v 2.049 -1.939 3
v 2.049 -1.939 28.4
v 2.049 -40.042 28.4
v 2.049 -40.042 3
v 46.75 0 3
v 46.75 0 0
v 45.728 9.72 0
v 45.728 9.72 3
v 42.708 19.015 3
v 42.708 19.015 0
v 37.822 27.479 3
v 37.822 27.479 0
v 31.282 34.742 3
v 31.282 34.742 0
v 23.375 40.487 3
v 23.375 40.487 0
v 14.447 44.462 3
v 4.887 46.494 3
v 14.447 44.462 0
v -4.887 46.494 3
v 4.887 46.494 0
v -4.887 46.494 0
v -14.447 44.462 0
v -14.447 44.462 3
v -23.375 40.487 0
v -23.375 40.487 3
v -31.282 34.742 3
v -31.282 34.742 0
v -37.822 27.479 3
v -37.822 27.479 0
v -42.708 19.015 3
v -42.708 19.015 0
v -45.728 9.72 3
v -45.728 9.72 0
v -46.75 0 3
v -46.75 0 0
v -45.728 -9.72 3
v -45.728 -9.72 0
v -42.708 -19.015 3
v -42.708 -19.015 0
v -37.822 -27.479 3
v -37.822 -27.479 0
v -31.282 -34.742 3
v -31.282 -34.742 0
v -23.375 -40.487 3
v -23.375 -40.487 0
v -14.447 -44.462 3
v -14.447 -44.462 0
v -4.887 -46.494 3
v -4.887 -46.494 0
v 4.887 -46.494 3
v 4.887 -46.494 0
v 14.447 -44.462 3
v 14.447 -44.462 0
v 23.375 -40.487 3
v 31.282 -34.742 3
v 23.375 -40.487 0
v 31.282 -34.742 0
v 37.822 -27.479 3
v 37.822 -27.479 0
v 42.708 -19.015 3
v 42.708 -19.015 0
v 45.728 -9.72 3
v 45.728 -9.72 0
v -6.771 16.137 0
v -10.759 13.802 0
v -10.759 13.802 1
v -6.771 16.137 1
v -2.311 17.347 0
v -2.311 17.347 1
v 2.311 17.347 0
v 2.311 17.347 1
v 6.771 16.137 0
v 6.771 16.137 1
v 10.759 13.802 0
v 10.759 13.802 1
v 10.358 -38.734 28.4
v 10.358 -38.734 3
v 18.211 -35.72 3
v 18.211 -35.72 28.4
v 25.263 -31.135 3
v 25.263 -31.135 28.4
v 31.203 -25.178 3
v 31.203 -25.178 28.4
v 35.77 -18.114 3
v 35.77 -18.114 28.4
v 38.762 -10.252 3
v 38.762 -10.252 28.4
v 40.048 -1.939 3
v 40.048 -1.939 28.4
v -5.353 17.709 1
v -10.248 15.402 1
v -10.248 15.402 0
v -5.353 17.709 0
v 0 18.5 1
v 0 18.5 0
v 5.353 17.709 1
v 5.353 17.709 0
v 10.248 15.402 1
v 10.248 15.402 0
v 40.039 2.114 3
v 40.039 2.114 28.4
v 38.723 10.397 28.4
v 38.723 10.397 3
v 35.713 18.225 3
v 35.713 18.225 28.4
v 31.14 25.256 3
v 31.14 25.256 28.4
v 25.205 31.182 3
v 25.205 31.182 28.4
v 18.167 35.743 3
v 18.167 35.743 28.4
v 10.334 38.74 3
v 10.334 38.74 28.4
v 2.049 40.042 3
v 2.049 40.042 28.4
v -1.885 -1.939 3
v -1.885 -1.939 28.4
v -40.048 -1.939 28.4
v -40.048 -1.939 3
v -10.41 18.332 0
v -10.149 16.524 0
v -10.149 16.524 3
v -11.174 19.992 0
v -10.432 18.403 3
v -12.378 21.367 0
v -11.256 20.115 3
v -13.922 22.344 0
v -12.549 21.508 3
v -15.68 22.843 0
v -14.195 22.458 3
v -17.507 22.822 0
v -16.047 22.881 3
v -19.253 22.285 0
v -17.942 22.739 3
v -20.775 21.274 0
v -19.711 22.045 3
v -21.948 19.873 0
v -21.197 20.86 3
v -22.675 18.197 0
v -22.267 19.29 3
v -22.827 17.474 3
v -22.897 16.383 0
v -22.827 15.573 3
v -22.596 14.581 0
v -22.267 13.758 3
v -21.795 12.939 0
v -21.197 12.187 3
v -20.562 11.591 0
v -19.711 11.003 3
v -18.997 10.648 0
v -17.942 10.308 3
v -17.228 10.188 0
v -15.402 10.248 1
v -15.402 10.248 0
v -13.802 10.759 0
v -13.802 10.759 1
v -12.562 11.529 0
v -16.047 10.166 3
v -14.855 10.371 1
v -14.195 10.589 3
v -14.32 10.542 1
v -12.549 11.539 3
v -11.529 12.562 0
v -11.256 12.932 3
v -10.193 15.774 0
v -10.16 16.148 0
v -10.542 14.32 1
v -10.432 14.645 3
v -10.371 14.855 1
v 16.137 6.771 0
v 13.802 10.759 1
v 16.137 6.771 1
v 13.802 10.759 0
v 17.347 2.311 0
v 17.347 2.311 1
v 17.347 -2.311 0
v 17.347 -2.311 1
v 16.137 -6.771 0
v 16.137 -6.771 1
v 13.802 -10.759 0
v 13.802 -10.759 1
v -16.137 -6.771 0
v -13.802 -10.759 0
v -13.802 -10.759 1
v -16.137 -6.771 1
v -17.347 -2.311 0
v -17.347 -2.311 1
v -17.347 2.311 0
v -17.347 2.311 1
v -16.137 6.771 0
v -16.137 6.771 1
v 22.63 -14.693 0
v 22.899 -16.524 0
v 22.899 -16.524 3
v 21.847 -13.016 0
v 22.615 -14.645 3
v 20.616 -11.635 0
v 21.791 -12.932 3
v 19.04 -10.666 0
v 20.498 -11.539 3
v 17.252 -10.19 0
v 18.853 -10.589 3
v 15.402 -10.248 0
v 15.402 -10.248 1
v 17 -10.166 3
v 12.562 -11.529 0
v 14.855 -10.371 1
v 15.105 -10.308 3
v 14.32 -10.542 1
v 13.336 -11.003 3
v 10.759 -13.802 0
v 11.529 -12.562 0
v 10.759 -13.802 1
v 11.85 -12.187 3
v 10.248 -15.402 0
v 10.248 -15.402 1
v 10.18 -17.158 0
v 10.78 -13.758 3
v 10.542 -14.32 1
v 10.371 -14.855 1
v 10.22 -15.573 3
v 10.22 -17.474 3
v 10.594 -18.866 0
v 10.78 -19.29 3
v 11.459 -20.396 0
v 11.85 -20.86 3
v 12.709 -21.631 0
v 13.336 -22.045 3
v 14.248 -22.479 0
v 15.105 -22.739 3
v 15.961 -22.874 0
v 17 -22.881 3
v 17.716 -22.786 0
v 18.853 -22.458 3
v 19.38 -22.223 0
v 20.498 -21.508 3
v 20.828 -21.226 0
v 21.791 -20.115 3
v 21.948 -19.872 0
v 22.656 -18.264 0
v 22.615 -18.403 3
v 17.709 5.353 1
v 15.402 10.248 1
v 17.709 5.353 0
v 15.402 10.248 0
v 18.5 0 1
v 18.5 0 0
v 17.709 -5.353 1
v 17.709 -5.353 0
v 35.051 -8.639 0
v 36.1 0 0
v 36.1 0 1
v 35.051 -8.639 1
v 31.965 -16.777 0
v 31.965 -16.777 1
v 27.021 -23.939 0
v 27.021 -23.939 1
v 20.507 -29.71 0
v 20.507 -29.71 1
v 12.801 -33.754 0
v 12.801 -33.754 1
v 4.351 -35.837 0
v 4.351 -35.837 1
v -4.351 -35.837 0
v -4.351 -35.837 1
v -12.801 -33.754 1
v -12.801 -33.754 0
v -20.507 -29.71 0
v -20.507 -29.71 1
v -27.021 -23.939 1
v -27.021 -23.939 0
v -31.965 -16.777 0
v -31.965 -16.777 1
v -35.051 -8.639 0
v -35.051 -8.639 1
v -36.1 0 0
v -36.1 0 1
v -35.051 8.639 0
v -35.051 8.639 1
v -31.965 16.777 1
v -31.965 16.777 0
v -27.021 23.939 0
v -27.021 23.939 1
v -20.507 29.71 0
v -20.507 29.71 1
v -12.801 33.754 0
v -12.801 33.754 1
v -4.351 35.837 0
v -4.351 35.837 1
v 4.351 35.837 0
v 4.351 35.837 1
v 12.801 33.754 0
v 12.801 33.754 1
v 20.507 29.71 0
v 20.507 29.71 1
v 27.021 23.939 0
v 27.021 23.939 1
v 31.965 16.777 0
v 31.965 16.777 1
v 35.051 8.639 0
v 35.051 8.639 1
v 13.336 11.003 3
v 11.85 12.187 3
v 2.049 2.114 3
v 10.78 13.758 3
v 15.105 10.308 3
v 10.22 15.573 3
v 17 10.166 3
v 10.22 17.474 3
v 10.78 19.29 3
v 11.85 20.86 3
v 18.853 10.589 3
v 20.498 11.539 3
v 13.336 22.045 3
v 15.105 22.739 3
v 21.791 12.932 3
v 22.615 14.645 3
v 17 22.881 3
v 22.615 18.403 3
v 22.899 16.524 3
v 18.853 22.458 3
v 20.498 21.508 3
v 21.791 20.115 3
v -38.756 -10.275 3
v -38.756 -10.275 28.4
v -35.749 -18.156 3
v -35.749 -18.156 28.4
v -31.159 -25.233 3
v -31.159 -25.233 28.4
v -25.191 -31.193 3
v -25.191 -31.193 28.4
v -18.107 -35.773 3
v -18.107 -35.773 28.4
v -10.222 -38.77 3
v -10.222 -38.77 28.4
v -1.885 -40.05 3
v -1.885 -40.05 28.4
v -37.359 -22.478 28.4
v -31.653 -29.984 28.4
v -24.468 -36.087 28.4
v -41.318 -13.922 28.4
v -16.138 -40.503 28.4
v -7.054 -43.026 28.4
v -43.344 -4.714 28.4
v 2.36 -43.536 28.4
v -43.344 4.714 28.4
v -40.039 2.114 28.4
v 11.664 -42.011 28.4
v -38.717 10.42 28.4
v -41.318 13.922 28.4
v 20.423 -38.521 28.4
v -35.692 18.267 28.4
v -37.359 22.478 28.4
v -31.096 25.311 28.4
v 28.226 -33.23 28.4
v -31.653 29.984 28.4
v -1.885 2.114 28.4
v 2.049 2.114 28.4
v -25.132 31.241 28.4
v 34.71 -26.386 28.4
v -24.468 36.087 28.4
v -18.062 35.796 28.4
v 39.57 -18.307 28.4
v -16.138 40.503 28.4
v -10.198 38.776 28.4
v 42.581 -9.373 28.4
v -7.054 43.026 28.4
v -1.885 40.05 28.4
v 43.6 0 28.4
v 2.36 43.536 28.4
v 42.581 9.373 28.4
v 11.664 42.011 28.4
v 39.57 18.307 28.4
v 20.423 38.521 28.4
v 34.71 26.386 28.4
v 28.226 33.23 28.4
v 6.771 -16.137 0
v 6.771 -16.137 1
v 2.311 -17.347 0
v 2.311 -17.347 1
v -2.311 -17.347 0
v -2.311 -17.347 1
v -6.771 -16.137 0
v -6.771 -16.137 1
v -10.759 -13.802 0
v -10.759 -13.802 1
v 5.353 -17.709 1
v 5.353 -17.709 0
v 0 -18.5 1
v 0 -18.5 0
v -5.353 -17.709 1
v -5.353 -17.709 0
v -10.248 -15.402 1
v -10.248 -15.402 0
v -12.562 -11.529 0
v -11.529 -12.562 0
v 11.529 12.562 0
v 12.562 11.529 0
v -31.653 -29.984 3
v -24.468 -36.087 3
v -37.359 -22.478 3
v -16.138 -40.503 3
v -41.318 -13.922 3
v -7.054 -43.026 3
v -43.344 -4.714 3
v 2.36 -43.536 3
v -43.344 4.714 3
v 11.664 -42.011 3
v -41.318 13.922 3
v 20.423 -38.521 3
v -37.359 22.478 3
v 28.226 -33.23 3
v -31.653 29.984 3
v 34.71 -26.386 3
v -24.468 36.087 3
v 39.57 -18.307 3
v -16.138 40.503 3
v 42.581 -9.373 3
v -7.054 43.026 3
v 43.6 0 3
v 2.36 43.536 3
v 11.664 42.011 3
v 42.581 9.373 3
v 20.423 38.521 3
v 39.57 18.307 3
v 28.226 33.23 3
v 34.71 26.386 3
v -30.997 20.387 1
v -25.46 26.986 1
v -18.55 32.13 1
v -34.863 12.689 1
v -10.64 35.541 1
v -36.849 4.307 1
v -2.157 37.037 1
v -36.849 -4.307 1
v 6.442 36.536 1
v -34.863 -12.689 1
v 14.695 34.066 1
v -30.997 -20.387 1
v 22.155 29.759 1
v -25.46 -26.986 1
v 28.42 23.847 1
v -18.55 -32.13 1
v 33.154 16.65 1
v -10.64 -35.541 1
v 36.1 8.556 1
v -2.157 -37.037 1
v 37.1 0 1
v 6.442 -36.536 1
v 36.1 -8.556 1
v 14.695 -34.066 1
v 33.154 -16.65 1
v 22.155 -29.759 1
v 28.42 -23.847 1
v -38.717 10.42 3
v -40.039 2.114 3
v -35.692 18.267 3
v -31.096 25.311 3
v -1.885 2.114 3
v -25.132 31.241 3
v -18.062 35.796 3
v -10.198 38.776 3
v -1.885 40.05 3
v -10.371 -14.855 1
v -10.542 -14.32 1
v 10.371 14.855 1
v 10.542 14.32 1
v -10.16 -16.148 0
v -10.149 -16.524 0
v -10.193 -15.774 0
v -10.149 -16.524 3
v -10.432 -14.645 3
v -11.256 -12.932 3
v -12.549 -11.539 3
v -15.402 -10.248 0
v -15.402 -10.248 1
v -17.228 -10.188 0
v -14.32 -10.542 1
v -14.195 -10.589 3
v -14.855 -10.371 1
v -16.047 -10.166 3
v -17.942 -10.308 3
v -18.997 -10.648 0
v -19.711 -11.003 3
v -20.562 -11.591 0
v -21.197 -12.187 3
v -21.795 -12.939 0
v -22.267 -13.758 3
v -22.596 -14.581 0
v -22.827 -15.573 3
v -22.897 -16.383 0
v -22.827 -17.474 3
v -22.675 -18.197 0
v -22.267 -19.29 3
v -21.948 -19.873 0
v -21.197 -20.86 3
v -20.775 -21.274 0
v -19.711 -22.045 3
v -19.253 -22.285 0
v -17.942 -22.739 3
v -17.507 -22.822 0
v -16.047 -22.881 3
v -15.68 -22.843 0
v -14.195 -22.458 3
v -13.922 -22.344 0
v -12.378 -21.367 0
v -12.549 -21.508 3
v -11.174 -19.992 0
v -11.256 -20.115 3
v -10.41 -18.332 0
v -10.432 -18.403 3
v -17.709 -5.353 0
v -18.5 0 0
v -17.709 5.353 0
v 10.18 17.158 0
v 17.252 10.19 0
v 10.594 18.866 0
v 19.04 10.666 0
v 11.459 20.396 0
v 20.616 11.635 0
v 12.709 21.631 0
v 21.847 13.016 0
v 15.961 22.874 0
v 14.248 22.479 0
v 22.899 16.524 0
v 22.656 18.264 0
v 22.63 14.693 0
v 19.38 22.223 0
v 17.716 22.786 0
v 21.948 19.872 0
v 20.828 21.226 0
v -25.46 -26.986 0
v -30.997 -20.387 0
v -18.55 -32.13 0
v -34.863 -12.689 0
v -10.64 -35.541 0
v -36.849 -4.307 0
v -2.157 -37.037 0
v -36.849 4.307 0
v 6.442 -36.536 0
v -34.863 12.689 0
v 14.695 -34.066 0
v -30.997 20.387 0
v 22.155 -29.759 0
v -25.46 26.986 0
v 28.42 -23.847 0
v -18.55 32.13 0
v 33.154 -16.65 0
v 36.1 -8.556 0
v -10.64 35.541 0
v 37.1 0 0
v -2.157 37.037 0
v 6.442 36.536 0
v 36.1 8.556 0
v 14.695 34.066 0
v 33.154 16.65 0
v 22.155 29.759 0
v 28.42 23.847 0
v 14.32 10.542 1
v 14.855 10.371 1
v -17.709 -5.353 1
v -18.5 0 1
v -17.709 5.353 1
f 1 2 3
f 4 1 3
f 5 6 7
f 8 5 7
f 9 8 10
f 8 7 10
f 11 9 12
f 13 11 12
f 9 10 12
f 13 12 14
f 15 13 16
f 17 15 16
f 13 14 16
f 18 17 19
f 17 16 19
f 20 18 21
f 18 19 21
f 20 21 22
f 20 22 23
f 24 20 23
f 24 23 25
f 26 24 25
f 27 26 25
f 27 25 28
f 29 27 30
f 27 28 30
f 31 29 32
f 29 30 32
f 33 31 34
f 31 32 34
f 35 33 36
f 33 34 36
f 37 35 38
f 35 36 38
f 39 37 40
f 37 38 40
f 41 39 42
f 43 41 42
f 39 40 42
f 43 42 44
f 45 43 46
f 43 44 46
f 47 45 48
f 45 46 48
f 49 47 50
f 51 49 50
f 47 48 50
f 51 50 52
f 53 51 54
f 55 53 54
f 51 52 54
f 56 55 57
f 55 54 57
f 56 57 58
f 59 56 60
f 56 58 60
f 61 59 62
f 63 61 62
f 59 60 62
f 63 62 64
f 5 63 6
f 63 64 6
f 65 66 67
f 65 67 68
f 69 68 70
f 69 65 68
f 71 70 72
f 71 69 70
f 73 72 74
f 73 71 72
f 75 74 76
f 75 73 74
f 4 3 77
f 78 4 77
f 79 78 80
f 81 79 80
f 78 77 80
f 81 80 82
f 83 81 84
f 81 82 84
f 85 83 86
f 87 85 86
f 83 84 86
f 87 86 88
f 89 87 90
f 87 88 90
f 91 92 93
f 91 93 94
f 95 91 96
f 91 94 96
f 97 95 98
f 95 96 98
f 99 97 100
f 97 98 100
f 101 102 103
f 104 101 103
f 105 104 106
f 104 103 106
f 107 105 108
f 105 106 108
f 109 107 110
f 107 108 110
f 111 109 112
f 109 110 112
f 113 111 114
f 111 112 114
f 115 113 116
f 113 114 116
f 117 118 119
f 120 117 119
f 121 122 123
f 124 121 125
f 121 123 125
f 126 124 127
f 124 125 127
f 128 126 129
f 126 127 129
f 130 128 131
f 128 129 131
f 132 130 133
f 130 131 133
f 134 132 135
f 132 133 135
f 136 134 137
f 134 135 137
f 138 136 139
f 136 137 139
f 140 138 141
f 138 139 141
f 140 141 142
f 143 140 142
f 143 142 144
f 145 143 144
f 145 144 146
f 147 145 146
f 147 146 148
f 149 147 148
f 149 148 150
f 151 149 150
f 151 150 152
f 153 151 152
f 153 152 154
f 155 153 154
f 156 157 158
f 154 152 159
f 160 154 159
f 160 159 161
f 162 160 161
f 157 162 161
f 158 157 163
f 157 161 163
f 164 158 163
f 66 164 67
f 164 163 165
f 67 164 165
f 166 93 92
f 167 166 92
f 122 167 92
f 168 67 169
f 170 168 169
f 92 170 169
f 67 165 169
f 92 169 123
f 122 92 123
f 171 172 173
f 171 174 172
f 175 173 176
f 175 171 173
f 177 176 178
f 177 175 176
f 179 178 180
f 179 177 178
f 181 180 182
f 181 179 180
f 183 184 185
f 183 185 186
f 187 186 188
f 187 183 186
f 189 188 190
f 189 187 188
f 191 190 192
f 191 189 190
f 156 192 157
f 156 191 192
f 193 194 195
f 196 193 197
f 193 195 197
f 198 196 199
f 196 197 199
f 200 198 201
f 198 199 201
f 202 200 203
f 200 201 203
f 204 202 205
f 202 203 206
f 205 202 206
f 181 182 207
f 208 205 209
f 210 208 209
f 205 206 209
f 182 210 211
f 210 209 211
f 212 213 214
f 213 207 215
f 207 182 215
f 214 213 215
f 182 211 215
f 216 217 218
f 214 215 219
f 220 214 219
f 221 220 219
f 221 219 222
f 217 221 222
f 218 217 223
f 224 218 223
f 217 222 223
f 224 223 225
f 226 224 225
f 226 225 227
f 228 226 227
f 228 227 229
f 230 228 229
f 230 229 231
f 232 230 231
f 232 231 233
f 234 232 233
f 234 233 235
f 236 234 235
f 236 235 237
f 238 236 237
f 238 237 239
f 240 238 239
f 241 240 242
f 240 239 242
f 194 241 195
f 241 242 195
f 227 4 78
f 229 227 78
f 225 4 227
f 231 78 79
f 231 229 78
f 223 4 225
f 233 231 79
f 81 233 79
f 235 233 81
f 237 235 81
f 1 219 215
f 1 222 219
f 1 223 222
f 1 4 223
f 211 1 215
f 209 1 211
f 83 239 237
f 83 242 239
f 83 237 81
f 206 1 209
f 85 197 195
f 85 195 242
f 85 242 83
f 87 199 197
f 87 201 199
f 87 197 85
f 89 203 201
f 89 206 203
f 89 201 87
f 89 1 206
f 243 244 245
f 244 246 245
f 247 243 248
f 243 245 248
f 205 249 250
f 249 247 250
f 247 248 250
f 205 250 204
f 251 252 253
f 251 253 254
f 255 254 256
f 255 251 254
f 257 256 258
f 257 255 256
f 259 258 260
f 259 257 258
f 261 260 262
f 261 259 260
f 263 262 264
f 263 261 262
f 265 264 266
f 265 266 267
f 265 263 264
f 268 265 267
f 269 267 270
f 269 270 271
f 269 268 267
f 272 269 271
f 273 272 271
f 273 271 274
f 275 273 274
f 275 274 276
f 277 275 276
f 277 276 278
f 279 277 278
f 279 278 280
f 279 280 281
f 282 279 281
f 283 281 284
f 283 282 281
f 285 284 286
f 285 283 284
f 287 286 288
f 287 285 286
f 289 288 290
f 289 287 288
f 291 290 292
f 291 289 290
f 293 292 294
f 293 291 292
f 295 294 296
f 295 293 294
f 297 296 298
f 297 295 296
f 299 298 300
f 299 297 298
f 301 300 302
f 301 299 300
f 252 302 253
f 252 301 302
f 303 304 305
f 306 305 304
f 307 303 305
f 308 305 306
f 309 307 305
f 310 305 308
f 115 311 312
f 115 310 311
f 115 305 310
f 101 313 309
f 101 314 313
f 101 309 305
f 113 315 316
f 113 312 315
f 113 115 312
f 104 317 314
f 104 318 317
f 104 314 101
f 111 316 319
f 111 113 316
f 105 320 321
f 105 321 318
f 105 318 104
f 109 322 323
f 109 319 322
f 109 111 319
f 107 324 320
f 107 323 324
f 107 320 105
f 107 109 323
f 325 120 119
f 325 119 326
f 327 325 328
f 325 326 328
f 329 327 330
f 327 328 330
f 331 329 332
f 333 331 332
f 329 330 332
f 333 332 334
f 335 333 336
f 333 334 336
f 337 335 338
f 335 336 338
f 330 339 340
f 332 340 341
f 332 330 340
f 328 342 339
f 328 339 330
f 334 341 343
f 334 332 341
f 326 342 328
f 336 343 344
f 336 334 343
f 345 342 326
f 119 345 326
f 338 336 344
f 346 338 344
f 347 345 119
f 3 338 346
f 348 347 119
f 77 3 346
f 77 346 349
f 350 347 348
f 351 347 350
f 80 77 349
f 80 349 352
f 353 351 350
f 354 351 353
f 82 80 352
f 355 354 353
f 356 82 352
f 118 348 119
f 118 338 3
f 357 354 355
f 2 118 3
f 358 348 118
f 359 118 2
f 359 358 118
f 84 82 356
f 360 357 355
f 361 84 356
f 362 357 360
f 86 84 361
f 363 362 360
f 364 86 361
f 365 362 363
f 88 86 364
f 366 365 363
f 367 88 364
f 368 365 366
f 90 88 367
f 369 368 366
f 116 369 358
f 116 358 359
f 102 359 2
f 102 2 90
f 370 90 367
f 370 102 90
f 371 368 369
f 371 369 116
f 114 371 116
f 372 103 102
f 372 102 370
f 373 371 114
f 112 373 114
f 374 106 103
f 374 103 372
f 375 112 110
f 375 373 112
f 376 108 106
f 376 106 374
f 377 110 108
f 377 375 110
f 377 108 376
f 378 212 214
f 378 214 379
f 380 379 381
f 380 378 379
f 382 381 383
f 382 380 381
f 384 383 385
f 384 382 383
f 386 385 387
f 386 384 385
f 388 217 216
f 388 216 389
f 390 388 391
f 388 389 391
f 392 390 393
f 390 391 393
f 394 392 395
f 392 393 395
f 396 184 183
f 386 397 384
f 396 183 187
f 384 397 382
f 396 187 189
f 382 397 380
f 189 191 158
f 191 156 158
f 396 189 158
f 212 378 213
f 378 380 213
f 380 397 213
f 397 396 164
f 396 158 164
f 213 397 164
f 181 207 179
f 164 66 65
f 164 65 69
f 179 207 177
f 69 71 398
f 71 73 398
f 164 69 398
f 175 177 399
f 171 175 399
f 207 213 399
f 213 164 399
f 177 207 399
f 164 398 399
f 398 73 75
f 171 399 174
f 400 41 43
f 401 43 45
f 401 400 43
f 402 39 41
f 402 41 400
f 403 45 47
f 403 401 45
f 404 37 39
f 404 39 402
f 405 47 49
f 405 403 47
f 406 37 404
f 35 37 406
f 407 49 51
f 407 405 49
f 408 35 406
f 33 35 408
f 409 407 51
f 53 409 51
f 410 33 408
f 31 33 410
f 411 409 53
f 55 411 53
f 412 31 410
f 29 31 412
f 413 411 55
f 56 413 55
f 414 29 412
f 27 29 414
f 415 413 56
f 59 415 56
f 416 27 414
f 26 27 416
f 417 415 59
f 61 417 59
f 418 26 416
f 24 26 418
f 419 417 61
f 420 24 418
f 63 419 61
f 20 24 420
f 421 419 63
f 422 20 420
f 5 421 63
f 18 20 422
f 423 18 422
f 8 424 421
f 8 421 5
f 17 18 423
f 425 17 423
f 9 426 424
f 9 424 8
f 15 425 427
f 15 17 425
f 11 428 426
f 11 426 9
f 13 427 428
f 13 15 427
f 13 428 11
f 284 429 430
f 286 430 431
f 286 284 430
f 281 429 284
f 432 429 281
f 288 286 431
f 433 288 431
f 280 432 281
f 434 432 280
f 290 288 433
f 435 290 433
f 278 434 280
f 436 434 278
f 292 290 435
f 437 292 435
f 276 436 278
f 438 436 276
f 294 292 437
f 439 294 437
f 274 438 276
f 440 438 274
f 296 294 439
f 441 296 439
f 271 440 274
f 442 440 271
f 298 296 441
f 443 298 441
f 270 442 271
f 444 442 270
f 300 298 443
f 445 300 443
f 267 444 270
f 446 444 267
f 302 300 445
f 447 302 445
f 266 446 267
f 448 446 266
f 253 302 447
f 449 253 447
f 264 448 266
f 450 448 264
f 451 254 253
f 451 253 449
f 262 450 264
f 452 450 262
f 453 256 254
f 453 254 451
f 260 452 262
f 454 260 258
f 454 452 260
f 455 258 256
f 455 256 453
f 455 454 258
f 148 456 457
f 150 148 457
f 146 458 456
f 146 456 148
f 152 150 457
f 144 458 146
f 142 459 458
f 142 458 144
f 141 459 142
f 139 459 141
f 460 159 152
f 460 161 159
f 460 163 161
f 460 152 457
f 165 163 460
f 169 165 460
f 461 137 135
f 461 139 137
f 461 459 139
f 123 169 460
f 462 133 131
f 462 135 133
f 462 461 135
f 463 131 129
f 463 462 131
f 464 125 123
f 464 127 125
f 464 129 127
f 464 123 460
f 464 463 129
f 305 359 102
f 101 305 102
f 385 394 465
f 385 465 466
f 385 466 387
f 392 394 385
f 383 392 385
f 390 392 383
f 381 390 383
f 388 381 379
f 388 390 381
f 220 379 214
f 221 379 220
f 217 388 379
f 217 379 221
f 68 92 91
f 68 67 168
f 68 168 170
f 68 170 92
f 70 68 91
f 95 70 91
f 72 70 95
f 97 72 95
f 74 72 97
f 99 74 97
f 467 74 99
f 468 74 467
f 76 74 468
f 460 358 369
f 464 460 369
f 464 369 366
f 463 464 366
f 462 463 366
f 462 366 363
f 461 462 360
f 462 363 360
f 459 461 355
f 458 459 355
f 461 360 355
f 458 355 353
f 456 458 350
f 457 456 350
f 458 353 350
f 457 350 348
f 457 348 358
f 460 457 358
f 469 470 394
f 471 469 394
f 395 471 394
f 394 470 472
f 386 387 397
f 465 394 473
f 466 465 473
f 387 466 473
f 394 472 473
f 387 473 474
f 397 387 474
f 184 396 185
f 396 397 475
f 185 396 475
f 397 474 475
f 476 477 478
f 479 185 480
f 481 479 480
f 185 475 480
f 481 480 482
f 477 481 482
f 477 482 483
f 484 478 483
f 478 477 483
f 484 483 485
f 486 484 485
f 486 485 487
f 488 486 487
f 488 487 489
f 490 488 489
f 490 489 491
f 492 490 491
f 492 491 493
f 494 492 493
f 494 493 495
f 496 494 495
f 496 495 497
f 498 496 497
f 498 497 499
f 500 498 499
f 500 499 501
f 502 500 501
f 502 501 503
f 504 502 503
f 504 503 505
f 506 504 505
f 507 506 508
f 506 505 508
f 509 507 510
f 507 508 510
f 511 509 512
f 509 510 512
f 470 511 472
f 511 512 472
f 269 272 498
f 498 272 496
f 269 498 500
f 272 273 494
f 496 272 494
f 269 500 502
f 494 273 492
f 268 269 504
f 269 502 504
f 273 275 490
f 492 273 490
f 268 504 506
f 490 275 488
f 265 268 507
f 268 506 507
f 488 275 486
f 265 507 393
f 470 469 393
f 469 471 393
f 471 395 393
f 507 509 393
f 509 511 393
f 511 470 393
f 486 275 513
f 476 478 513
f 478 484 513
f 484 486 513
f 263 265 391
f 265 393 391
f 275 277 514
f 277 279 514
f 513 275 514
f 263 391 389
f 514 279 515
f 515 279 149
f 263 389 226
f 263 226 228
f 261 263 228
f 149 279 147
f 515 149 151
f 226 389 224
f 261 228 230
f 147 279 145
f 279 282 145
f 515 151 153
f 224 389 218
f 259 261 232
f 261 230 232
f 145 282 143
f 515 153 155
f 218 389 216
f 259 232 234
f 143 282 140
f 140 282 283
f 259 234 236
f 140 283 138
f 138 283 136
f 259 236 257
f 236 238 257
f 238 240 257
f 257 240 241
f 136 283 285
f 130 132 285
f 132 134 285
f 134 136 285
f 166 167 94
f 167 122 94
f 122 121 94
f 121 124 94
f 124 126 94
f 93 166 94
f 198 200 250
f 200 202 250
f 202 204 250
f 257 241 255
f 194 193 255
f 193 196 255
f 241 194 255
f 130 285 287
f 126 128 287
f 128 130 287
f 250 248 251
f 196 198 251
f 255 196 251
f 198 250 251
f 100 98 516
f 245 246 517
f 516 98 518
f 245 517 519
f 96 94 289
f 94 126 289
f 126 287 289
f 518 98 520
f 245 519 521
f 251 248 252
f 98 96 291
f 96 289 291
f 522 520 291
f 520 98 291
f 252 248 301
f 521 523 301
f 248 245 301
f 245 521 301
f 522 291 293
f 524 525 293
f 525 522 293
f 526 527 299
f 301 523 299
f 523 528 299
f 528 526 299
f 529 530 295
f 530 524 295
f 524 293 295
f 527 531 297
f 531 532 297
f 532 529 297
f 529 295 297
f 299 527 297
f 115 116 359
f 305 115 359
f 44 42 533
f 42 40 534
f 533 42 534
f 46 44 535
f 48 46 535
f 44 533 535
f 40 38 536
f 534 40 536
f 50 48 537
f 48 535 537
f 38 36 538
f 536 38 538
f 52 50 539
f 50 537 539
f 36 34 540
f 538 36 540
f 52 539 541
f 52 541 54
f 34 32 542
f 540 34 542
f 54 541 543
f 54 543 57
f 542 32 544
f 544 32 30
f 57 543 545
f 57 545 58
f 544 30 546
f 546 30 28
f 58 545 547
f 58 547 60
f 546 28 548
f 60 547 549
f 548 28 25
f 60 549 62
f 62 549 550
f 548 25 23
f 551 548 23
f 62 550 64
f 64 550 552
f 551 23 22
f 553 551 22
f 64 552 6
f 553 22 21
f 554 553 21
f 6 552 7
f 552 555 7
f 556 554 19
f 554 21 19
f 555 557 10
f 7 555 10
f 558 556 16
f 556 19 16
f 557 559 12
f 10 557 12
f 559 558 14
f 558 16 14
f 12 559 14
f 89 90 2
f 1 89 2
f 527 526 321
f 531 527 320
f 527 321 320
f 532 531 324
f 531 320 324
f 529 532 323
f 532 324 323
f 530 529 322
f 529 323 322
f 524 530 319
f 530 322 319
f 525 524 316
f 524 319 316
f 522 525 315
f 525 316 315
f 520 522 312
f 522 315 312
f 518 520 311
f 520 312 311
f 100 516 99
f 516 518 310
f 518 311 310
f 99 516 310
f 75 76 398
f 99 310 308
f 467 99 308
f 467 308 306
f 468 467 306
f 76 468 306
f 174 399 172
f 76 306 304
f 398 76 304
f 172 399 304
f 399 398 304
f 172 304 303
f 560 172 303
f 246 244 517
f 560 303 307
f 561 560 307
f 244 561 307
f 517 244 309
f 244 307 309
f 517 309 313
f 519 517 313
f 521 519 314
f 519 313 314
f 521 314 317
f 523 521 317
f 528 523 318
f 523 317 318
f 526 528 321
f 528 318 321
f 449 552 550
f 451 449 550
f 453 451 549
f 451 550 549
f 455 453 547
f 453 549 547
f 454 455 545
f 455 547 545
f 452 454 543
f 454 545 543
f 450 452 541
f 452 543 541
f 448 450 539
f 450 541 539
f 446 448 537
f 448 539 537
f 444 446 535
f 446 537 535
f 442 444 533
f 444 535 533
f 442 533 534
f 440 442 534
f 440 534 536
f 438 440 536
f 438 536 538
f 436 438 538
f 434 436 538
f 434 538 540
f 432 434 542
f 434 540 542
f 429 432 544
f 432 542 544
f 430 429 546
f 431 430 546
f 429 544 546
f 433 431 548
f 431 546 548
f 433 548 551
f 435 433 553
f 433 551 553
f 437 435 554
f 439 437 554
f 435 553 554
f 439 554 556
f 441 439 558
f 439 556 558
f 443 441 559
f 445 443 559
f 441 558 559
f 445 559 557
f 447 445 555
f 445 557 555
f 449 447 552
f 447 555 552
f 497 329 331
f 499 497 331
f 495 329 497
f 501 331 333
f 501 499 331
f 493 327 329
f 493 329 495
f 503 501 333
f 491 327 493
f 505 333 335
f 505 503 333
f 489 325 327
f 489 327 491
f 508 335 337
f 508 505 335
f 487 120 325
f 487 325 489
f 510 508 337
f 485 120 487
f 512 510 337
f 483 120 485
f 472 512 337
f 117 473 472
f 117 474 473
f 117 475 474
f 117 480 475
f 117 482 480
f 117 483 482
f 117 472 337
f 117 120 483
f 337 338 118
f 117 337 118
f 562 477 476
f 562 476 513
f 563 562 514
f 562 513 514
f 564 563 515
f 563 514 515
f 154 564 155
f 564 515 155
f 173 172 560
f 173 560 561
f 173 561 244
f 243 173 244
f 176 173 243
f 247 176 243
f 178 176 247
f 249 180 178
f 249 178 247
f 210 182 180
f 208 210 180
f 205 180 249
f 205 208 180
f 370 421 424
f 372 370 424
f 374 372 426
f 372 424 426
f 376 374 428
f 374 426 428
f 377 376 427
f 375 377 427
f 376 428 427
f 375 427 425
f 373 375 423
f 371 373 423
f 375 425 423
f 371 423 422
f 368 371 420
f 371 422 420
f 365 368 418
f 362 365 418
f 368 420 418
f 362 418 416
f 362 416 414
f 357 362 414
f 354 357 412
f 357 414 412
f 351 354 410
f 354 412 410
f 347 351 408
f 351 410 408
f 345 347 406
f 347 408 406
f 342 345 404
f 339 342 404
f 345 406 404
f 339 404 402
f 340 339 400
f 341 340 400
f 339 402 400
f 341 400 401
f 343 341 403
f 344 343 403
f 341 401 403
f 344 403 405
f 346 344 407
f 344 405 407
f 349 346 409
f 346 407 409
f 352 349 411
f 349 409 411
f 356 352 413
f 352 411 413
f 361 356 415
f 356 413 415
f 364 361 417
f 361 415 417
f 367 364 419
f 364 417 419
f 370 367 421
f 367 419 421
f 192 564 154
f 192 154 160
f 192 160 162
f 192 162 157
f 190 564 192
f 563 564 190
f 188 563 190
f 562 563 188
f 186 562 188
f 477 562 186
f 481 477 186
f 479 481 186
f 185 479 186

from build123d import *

# Parameters (mm, degrees)
F0_R     = 46.75
F1_DEPTH = 3
F2_R     = 43.6
F3_DEPTH = 25.4
F4_R     = 37.1
F4_R_2   = 36.1
F4_R_3   = 18.5
F4_R_4   = 17.5
F5_DEPTH = 1
F7_DEPTH = 25.4
F8_R     = 6.375059
F9_DEPTH = 3.001


with BuildPart() as f1:
    # F0 (on Top) → F1 (new body)
    with BuildSketch(Plane.XY):
        Circle(F0_R)
    extrude(amount=F1_DEPTH)

    # F2 (on face) → F3 (join)
    with BuildSketch(Plane.XY.offset(3)):
        Circle(F2_R)
    extrude(amount=F3_DEPTH)

    # F4 (on face) → F5 (cut)
    with BuildSketch(Plane(origin=(0, 0, 0), x_dir=(1, 0, 0), z_dir=(0, 0, -1))):
        Circle(F4_R)
        Circle(F4_R_2, mode=Mode.SUBTRACT)
        Circle(F4_R_3)
        Circle(F4_R_4, mode=Mode.SUBTRACT)
    extrude(amount=-F5_DEPTH, mode=Mode.SUBTRACT)

    # F6 (on face) → F7 (cut, through all)
    with BuildSketch(Plane.XY.offset(28.4)):
        with BuildLine():
            Line((-1.884867, -40.050467), (-1.884867, -1.939485))
            Line((-1.884867, -1.939485), (-40.047859, -1.939485))
            ThreePointArc((-40.047859, -1.939485), (-28.331963, -28.370627), (-1.884867, -40.050467))
        make_face()
        with BuildLine():
            Line((-40.039012, 2.114258), (-1.884867, 2.114258))
            Line((-1.884867, 2.114258), (-1.884867, 40.050467))
            ThreePointArc((-1.884867, 40.050467), (-28.269982, 28.432388), (-40.039012, 2.114258))
        make_face()
        with BuildLine():
            Line((2.048553, 40.042428), (2.048553, 2.114258))
            Line((2.048553, 2.114258), (40.039012, 2.114258))
            ThreePointArc((40.039012, 2.114258), (28.32803, 28.374554), (2.048553, 40.042428))
        make_face()
        with BuildLine():
            Line((40.047859, -1.939485), (2.048553, -1.939485))
            Line((2.048553, -1.939485), (2.048553, -40.042428))
            ThreePointArc((2.048553, -40.042428), (28.389884, -28.312666), (40.047859, -1.939485))
        make_face()
    extrude(amount=-F7_DEPTH, mode=Mode.SUBTRACT)

    # F8 (on face) → F9 (cut, through all)
    with BuildSketch(Plane.XY.offset(3)):
        with Locations((-16.523598, 16.523598)):
            Circle(F8_R)
        with Locations((16.523598, 16.523598)):
            Circle(F8_R)
        with Locations((16.523598, -16.523598)):
            Circle(F8_R)
        with Locations((-16.523598, -16.523598)):
            Circle(F8_R)
    extrude(amount=-F9_DEPTH, mode=Mode.SUBTRACT)


solid = f1.part
